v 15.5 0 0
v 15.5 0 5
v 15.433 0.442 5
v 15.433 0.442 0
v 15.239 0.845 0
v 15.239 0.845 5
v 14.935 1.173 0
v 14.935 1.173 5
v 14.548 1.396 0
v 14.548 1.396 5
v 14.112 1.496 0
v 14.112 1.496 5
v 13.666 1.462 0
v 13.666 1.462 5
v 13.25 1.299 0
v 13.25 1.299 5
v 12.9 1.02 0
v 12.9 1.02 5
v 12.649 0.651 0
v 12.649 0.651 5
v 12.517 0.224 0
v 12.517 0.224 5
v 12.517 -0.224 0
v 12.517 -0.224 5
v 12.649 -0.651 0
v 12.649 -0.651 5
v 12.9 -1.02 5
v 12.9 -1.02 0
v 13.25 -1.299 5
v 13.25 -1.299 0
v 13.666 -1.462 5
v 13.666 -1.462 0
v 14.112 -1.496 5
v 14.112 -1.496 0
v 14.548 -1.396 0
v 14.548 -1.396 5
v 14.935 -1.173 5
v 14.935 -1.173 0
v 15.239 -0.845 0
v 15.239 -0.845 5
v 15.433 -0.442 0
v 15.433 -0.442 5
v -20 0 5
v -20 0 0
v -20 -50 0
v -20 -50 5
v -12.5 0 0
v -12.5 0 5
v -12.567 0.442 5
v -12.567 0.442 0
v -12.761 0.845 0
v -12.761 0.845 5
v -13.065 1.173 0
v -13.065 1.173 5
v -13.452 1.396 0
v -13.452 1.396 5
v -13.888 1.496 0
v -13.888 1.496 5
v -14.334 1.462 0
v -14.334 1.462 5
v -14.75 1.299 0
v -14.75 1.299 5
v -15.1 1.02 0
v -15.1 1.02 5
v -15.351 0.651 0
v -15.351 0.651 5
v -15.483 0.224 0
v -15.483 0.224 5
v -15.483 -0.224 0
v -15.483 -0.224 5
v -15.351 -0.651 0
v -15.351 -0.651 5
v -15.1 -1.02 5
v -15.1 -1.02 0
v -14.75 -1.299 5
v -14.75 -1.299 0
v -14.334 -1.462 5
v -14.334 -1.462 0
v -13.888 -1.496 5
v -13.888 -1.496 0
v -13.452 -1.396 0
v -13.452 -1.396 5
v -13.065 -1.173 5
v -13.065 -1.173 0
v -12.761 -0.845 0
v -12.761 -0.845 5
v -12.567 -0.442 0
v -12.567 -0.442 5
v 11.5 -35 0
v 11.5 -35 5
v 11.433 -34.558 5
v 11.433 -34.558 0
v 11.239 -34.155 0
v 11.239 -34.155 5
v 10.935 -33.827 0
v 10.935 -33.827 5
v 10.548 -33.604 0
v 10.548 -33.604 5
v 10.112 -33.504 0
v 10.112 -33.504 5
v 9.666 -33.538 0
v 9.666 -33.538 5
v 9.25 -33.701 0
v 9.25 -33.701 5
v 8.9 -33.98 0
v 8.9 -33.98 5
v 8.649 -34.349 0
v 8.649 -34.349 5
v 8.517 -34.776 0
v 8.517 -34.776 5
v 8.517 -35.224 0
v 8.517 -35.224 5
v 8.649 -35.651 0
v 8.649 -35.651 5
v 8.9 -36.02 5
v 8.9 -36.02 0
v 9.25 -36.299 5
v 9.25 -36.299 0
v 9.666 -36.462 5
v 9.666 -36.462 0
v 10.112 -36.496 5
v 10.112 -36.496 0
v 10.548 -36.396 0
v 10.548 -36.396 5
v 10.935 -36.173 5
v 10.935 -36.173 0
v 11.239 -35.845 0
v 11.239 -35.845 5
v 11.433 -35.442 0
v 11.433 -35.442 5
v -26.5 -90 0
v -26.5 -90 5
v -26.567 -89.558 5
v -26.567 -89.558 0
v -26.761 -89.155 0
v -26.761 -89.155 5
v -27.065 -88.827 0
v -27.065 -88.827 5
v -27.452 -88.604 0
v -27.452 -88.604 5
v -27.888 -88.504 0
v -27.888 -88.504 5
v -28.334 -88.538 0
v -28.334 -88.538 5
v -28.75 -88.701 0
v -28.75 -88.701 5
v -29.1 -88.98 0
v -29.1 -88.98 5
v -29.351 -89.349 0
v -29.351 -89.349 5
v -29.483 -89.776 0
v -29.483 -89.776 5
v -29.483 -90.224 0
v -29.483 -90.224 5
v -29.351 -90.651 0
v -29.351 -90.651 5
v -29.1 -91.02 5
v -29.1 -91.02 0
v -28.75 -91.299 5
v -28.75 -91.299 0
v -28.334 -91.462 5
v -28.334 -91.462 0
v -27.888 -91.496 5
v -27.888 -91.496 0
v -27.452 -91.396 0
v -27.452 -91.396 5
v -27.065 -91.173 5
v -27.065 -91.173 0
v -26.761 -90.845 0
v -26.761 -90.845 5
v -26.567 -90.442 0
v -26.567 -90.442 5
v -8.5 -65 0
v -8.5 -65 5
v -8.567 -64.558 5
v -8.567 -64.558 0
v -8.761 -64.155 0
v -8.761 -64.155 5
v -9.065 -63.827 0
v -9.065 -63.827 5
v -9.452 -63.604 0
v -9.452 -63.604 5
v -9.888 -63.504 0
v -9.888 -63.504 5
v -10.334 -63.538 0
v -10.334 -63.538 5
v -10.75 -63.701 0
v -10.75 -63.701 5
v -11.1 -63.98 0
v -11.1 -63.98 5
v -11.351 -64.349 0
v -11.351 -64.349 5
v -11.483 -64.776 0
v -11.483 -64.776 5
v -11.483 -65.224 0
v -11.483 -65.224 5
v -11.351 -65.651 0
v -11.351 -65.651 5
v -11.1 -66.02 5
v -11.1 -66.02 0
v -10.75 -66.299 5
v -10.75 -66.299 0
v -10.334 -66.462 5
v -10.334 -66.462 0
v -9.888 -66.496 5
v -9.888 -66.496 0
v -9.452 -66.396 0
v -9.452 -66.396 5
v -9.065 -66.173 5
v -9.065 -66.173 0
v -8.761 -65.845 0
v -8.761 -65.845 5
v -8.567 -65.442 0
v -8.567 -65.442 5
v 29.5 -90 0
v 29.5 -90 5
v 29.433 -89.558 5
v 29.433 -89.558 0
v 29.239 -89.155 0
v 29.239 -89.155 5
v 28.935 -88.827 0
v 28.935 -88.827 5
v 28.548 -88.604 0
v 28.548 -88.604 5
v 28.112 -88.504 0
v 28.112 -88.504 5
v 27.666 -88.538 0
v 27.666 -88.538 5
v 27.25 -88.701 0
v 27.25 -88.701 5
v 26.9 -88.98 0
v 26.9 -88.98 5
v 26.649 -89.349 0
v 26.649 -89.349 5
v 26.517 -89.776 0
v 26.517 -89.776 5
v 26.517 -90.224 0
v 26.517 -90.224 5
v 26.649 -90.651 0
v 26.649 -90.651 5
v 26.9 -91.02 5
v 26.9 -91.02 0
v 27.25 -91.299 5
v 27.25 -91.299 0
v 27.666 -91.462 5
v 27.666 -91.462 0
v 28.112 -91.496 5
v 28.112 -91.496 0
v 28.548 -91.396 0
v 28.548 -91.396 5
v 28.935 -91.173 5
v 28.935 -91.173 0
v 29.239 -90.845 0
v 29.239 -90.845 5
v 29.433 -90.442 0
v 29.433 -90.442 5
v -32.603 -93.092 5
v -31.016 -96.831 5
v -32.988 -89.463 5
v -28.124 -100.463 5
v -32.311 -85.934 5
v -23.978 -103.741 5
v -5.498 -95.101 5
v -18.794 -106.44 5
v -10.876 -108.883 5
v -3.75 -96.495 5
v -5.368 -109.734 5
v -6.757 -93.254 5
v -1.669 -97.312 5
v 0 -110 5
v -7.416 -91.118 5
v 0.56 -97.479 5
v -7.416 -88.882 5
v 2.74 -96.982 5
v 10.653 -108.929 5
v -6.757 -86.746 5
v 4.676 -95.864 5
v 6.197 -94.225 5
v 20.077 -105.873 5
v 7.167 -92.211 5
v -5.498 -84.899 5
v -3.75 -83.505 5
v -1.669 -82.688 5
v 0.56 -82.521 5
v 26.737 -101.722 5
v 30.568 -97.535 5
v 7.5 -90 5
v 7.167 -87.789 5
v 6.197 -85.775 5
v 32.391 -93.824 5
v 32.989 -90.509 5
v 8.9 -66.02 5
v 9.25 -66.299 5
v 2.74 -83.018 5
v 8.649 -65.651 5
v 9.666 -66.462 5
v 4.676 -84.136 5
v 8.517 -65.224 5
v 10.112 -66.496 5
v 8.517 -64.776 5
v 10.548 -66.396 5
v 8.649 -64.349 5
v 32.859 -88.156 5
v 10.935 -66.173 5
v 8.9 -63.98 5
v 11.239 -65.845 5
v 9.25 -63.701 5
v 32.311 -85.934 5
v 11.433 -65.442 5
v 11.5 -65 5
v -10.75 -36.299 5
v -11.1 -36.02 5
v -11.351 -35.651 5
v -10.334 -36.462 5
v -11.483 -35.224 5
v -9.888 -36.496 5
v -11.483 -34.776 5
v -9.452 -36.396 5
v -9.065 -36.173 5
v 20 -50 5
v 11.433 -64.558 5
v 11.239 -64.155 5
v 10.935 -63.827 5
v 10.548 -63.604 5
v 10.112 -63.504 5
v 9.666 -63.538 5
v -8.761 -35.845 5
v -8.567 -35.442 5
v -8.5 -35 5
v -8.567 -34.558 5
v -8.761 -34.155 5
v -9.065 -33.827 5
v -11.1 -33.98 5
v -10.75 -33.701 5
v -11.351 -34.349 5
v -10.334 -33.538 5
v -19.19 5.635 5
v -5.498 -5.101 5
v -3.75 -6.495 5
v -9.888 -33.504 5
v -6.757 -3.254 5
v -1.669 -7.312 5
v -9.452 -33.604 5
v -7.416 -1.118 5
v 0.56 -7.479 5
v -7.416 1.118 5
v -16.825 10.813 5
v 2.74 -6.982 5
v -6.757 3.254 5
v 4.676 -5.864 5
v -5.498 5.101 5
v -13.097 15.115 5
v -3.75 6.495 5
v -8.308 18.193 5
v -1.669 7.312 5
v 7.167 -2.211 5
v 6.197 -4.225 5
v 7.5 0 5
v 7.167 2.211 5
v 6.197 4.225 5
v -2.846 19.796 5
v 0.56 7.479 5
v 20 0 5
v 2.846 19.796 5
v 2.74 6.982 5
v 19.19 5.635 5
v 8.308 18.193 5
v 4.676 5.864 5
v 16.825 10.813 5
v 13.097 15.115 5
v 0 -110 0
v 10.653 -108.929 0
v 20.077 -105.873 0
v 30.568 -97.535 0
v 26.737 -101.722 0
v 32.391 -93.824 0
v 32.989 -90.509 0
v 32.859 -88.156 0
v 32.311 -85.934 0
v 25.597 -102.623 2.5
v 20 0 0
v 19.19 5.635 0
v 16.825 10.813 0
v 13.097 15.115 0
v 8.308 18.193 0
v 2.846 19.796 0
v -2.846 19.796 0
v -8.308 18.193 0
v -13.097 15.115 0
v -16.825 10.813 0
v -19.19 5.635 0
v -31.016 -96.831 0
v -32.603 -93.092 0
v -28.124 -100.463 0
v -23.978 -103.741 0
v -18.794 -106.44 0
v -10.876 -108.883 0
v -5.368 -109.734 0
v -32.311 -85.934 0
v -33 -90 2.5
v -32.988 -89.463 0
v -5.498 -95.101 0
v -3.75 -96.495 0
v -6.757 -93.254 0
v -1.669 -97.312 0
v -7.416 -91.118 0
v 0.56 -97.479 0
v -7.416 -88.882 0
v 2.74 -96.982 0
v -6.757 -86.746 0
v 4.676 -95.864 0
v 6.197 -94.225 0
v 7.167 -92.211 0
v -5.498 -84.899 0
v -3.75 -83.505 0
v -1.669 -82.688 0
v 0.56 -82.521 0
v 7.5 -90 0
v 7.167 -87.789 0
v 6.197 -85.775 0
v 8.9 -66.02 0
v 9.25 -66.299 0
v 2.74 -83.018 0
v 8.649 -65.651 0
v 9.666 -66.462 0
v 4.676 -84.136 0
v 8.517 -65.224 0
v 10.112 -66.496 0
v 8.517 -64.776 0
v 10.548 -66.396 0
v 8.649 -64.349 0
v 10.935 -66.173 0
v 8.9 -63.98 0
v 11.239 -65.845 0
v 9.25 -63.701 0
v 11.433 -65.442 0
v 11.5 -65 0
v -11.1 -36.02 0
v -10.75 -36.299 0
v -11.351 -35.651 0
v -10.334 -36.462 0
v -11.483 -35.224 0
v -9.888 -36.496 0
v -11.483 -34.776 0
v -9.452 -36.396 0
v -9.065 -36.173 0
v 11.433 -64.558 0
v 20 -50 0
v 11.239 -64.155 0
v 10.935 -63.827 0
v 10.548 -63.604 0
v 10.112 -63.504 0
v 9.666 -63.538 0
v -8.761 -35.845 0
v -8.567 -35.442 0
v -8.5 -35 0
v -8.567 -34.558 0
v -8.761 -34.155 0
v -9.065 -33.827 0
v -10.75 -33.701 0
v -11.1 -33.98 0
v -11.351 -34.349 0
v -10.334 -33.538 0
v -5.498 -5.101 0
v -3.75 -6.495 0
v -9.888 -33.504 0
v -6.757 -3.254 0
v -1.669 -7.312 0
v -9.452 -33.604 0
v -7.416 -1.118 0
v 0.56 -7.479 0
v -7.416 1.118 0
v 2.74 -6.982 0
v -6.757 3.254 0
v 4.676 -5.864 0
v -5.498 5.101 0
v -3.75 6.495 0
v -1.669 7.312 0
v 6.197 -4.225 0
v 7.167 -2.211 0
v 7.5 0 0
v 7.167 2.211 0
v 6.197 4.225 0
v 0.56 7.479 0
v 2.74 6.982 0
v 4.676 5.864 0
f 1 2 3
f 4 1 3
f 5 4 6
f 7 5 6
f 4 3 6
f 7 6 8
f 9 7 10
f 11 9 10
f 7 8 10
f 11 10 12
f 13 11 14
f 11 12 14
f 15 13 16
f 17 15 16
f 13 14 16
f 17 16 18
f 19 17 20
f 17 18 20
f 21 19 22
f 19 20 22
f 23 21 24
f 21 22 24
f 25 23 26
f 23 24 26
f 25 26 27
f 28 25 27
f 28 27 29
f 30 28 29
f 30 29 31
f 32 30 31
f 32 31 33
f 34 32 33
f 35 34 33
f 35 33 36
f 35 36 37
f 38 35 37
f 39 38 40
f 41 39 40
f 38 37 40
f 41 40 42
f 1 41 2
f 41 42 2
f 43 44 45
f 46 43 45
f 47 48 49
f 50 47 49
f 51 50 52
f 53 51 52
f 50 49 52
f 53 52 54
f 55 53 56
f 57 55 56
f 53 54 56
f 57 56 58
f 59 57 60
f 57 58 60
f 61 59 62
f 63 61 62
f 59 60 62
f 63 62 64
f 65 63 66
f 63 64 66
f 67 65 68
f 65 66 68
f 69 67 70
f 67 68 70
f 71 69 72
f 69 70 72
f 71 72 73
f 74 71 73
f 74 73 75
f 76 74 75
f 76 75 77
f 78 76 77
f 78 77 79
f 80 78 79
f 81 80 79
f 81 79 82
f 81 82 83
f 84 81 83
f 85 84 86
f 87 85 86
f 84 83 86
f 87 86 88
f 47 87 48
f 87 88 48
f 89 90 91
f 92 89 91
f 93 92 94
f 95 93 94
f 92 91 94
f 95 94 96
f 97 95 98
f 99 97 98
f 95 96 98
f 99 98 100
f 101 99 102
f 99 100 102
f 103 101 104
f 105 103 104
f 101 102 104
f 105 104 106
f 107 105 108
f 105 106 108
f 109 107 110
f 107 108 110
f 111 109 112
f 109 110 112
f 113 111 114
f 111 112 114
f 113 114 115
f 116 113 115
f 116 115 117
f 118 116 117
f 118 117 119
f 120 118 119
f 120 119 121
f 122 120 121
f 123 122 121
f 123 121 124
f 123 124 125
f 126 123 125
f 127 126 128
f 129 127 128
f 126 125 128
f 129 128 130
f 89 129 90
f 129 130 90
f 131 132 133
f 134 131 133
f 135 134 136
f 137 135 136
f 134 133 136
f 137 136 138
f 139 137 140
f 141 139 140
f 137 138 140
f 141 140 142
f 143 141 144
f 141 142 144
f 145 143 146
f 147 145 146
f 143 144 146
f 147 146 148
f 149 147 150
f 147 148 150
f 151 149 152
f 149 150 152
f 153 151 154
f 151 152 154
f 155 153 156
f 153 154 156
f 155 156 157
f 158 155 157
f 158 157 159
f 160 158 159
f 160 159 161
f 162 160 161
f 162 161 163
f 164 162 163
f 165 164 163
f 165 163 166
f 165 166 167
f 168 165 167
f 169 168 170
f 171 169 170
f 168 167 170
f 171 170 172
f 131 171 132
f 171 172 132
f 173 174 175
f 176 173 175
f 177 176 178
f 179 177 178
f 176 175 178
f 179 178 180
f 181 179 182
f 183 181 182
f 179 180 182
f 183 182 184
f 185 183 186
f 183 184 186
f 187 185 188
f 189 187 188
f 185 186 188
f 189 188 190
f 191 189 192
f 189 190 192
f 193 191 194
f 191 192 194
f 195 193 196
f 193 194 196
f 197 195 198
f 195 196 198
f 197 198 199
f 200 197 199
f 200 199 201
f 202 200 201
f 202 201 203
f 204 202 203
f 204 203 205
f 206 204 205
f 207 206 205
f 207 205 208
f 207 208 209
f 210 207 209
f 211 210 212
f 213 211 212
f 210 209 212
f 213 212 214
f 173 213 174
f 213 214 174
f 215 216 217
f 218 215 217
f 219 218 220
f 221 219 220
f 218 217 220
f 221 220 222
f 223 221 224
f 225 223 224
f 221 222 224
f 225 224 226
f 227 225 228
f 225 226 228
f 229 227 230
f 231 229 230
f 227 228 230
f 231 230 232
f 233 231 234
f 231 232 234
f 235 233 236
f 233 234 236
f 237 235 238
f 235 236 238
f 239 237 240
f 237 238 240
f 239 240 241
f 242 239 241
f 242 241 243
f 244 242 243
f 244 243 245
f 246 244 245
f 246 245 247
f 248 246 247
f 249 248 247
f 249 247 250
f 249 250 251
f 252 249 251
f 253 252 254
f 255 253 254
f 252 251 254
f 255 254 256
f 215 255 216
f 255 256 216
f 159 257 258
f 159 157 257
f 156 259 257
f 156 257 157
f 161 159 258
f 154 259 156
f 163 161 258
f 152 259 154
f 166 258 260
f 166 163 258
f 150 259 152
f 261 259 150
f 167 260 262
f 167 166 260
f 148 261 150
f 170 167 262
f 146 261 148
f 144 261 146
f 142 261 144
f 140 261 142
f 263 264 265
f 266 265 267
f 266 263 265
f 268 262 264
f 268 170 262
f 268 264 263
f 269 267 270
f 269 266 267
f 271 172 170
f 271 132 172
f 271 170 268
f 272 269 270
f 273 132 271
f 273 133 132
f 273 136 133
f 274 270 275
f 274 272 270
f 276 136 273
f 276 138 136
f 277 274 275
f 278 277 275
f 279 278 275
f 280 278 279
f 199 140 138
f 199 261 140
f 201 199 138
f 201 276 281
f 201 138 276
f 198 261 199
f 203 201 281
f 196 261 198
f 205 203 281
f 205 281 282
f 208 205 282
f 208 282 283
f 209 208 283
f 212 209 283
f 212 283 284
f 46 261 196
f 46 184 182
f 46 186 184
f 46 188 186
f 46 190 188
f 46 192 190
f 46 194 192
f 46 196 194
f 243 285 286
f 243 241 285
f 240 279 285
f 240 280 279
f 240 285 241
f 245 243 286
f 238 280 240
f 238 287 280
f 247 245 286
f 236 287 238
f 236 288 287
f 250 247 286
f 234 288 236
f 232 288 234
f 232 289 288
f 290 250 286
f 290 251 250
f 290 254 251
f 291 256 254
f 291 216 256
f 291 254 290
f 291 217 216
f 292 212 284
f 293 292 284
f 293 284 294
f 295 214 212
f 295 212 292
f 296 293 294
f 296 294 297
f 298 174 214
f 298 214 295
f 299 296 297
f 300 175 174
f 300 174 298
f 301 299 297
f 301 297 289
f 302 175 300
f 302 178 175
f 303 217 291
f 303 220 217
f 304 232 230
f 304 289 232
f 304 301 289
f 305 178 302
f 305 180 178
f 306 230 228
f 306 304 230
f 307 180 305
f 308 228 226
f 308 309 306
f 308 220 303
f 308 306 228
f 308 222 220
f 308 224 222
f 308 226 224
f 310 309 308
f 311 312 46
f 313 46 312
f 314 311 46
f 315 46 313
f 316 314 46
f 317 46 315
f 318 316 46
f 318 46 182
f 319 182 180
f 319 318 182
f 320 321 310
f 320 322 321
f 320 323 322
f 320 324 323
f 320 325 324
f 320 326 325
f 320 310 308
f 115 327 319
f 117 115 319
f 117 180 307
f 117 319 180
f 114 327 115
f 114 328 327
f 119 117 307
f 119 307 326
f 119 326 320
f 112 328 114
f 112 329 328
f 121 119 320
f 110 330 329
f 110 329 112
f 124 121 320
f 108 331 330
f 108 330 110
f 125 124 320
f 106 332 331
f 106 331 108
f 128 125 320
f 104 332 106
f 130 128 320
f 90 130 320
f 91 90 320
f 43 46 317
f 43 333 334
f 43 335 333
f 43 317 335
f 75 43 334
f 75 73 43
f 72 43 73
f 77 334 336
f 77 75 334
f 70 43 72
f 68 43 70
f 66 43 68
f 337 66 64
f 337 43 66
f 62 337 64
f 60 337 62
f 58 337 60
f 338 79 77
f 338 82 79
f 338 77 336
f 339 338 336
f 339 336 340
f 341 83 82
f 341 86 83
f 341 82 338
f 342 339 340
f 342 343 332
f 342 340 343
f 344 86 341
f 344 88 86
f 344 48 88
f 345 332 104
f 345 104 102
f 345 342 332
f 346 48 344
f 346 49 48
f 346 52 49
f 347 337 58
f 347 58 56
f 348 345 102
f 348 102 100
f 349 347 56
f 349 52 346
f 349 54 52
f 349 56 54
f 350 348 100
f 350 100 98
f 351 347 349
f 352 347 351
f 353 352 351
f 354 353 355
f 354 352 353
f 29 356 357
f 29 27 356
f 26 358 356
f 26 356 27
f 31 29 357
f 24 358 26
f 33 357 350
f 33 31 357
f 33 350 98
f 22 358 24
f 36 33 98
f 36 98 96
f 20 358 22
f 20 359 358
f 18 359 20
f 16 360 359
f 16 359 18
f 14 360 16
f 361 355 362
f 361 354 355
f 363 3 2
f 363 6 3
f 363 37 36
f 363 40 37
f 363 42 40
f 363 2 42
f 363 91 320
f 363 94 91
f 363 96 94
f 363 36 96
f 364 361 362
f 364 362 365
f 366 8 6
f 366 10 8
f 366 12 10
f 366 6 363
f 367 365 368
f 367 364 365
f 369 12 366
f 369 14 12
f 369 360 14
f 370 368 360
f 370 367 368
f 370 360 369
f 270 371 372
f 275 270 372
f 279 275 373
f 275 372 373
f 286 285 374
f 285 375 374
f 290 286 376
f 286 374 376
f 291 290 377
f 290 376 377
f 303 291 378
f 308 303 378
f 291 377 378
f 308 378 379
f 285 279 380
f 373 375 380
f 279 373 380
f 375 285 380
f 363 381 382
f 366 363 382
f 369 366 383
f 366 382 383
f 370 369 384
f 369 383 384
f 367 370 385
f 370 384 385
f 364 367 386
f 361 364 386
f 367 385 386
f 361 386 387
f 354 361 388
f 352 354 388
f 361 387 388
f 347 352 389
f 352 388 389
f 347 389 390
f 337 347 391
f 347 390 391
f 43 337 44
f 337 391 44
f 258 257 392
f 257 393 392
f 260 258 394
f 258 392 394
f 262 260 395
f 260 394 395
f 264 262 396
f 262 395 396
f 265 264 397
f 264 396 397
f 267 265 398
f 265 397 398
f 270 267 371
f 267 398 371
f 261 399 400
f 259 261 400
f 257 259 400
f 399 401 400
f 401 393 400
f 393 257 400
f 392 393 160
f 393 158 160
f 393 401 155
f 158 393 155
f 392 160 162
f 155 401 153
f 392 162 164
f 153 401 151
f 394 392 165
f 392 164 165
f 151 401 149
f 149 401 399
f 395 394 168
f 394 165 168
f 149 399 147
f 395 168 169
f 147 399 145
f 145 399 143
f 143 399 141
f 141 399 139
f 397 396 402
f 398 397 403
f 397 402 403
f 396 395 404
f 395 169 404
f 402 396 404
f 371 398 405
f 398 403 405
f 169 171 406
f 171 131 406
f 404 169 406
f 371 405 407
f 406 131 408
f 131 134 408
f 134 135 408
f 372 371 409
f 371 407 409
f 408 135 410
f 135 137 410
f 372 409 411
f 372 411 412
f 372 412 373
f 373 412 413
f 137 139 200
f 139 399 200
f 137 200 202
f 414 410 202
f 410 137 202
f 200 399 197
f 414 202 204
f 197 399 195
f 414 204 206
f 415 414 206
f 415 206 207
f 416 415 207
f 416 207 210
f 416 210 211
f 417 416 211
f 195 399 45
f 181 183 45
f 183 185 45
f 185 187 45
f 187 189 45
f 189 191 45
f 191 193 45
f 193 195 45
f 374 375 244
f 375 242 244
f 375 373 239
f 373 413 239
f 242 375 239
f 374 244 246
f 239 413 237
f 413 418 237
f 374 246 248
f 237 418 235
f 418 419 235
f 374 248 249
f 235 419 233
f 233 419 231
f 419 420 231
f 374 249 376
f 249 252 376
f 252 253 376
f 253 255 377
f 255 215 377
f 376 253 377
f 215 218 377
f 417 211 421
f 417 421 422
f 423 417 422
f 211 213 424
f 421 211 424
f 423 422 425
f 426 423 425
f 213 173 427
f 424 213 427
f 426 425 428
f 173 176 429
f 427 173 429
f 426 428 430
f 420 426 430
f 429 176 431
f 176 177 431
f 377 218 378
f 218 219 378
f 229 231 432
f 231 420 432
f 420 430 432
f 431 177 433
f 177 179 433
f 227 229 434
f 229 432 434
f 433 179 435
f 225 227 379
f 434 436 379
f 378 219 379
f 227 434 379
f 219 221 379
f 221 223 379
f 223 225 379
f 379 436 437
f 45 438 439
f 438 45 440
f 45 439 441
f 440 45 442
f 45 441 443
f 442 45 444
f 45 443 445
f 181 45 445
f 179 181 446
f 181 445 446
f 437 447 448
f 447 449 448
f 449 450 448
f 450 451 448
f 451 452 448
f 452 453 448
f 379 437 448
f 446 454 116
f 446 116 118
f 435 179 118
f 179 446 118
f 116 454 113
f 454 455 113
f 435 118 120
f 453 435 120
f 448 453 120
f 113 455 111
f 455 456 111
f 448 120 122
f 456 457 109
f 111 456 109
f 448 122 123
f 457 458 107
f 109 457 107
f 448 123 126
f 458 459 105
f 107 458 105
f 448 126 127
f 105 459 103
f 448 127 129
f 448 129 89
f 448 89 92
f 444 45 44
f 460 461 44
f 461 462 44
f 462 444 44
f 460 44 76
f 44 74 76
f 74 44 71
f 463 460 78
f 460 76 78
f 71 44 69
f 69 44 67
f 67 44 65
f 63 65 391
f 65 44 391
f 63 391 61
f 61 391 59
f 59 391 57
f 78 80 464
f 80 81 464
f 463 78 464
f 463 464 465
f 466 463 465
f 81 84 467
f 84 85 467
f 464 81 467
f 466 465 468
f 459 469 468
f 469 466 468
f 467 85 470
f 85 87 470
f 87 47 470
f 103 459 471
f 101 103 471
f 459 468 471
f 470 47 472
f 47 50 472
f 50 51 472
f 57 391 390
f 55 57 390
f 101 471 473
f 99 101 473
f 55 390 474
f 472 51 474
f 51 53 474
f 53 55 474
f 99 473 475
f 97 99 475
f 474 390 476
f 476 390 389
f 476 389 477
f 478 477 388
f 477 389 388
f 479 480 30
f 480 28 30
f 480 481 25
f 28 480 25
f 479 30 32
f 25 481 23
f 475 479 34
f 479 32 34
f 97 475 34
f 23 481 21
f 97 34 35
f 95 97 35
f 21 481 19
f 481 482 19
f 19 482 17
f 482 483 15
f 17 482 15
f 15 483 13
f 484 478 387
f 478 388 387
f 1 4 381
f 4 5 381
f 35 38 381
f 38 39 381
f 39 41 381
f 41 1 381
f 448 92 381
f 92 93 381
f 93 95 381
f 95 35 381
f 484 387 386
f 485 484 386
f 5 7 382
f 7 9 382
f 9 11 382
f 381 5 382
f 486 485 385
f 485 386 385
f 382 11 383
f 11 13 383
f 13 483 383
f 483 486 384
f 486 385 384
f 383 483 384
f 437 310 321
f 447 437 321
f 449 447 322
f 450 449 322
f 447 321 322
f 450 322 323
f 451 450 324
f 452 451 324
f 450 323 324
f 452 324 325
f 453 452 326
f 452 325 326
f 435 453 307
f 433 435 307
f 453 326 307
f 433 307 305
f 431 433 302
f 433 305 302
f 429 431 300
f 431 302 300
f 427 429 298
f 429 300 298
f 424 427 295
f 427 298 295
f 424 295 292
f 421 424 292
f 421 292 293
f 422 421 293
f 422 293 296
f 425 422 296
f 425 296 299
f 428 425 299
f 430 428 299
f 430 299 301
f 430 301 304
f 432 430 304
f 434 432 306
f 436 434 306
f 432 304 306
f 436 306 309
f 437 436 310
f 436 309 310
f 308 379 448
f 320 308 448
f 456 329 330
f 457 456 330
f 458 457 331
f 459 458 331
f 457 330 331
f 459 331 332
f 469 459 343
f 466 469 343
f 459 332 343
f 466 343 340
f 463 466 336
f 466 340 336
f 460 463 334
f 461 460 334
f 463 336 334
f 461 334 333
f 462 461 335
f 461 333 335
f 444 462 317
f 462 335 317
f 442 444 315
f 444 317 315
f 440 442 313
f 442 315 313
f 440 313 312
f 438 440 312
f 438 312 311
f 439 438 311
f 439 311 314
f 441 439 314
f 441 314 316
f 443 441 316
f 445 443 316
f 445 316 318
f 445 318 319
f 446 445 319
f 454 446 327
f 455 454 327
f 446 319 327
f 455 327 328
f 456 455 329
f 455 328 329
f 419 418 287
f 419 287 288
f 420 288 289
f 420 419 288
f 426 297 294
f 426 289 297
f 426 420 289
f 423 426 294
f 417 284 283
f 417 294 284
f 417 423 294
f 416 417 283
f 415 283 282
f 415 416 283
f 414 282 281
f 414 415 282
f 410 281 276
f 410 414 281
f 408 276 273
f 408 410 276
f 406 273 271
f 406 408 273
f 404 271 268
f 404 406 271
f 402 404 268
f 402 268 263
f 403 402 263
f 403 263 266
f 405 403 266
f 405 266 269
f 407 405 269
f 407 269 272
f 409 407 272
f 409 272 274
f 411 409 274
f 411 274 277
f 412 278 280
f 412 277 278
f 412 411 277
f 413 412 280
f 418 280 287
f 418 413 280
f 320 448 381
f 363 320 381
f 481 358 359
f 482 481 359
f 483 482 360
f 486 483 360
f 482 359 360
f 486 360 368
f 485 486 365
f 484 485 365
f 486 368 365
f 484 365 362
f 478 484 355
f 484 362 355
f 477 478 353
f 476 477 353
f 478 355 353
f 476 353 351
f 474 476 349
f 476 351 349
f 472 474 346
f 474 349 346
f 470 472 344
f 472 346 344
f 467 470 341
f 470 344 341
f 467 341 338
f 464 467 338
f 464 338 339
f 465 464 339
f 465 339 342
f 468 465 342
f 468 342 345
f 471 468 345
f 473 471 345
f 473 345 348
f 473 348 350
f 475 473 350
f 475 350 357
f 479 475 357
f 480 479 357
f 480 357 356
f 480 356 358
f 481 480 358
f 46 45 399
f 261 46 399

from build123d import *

# Parameters (mm, degrees)
EXTRUDE_1_DEPTH          = 5
CUT_EXTRUDE_2_DEPTH      = 115.952164093
CUT_EXTRUDE_2_DEPTH_BACK = 115.952164093
SKETCH_3_OUTSIDE_W       = 97.176
SKETCH_3_OUTSIDE_H       = 161.176
SKETCH_3_OUTSIDE_R       = 7.5
SKETCH_4_R               = 7.5
CUT_EXTRUDE_3_DEPTH      = 115.952164093
SKETCH_5_R               = 1.5
CUT_EXTRUDE_4_DEPTH      = 5


with BuildPart() as part:
    # 草图1 → 凸台-拉伸1 (new body)
    with BuildSketch(Plane.XY):
        with BuildLine():
            Line((-20, 0), (-20, -50))
            Line((-20, -50), (-20, -74.091630608))
            add(Edge.make_bspline(
                [(-2.03e-07, -70), (-11.13946442, -70.000000042), (-20, -74.091630608)],
                knots=[4.712388987, 4.712388987, 4.712388987, 5.363487565, 5.363487565, 5.363487565], degree=2, weights=[1, 0.947475191, 1]))
            add(Edge.make_bspline(
                [(20, -74.091630608), (11.13946424, -69.999999958), (-2.03e-07, -70)],
                knots=[4.061290395, 4.061290395, 4.061290395, 4.712388987, 4.712388987, 4.712388987], degree=2, weights=[1, 0.947475189, 1]))
            Line((20, -74.091630608), (20, -50))
            Line((20, -50), (20, 0))
            ThreePointArc((20, 0), (0, -20), (-20, 0))
        make_face()
        with BuildLine():
            Line((-20, -74.091630608), (-20, -50))
            Line((-20, -50), (-32.310858712, -85.934042004))
            add(Edge.make_bspline(
                [(-20, -74.091630608), (-29.804870228, -78.619337355), (-32.310858712, -85.934042004)],
                knots=[5.363487565, 5.363487565, 5.363487565, 6.078460318, 6.078460318, 6.078460318], degree=2, weights=[1, 0.936779351, 1]))
        make_face()
        with BuildLine():
            add(Edge.make_bspline(
                [(-20, -74.091630608), (-29.804870228, -78.619337355), (-32.310858712, -85.934042004)],
                knots=[5.363487565, 5.363487565, 5.363487565, 6.078460318, 6.078460318, 6.078460318], degree=2, weights=[1, 0.936779351, 1]))
            add(Edge.make_bspline(
                [(-32.310858712, -85.934042004), (-33, -87.945569596), (-33, -90)],
                knots=[6.078460318, 6.078460318, 6.078460318, 6.283185307, 6.283185307, 6.283185307], degree=2, weights=[1, 0.994765533, 1]))
            add(Edge.make_bspline(
                [(-33, -90), (-33, -109.999999875), (-2.06e-07, -110)],
                knots=[0, 0, 0, 1.570796321, 1.570796321, 1.570796321], degree=2, weights=[1, 0.707106783, 1]))
            ThreePointArc((-2.06e-07, -110), (-14.142135697, -104.142135551), (-20, -90))
            Line((-20, -90), (-20, -74.091630608))
        make_face()
        with BuildLine():
            add(Edge.make_bspline(
                [(-2.03e-07, -70), (-11.13946442, -70.000000042), (-20, -74.091630608)],
                knots=[4.712388987, 4.712388987, 4.712388987, 5.363487565, 5.363487565, 5.363487565], degree=2, weights=[1, 0.947475191, 1]))
            Line((-20, -74.091630608), (-20, -90))
            ThreePointArc((-20, -90), (-14.142135696, -75.857864448), (-2.03e-07, -70))
        make_face()
        with BuildLine():
            add(Edge.make_bspline(
                [(-20, -74.091630608), (-29.804870228, -78.619337355), (-32.310858712, -85.934042004)],
                knots=[5.363487565, 5.363487565, 5.363487565, 6.078460318, 6.078460318, 6.078460318], degree=2, weights=[1, 0.936779351, 1]))
            add(Edge.make_bspline(
                [(-32.310858712, -85.934042004), (-33, -87.945569596), (-33, -90)],
                knots=[6.078460318, 6.078460318, 6.078460318, 6.283185307, 6.283185307, 6.283185307], degree=2, weights=[1, 0.994765533, 1]))
            add(Edge.make_bspline(
                [(-33, -90), (-33, -109.999999875), (-2.06e-07, -110)],
                knots=[0, 0, 0, 1.570796321, 1.570796321, 1.570796321], degree=2, weights=[1, 0.707106783, 1]))
            ThreePointArc((-2.06e-07, -110), (-14.142135697, -104.142135551), (-20, -90))
            Line((-20, -90), (-20, -74.091630608))
        make_face()
        with BuildLine():
            add(Edge.make_bspline(
                [(-2.03e-07, -70), (-11.13946442, -70.000000042), (-20, -74.091630608)],
                knots=[4.712388987, 4.712388987, 4.712388987, 5.363487565, 5.363487565, 5.363487565], degree=2, weights=[1, 0.947475191, 1]))
            Line((-20, -74.091630608), (-20, -90))
            ThreePointArc((-20, -90), (-14.142135696, -75.857864448), (-2.03e-07, -70))
        make_face()
        with BuildLine():
            add(Edge.make_bspline(
                [(20, -74.091630608), (11.13946424, -69.999999958), (-2.03e-07, -70)],
                knots=[4.061290395, 4.061290395, 4.061290395, 4.712388987, 4.712388987, 4.712388987], degree=2, weights=[1, 0.947475189, 1]))
            ThreePointArc((-2.03e-07, -70), (14.142135552, -75.857864304), (20, -90))
            Line((20, -90), (20, -74.091630608))
        make_face()
        with BuildLine():
            ThreePointArc((20, -90), (14.142135551, -104.142135697), (-2.06e-07, -110))
            add(Edge.make_bspline(
                [(-2.06e-07, -110), (40.555759481, -110.000000153), (32.310858712, -85.934042004)],
                knots=[1.570796321, 1.570796321, 1.570796321, 3.346317643, 3.346317643, 3.346317643], degree=2, weights=[1, 0.631150574, 1]))
            add(Edge.make_bspline(
                [(32.310858712, -85.934042004), (29.804870228, -78.619337355), (20, -74.091630608)],
                knots=[3.346317643, 3.346317643, 3.346317643, 4.061290395, 4.061290395, 4.061290395], degree=2, weights=[1, 0.936779351, 1]))
            Line((20, -74.091630608), (20, -90))
        make_face()
        with BuildLine():
            Line((32.310858712, -85.934042004), (20, -50))
            Line((20, -50), (20, -74.091630608))
            add(Edge.make_bspline(
                [(32.310858712, -85.934042004), (29.804870228, -78.619337355), (20, -74.091630608)],
                knots=[3.346317643, 3.346317643, 3.346317643, 4.061290395, 4.061290395, 4.061290395], degree=2, weights=[1, 0.936779351, 1]))
        make_face()
        with BuildLine():
            add(Edge.make_bspline(
                [(20, -74.091630608), (11.13946424, -69.999999958), (-2.03e-07, -70)],
                knots=[4.061290395, 4.061290395, 4.061290395, 4.712388987, 4.712388987, 4.712388987], degree=2, weights=[1, 0.947475189, 1]))
            ThreePointArc((-2.03e-07, -70), (14.142135552, -75.857864304), (20, -90))
            Line((20, -90), (20, -74.091630608))
        make_face()
        with BuildLine():
            ThreePointArc((20, -90), (14.142135551, -104.142135697), (-2.06e-07, -110))
            add(Edge.make_bspline(
                [(-2.06e-07, -110), (40.555759481, -110.000000153), (32.310858712, -85.934042004)],
                knots=[1.570796321, 1.570796321, 1.570796321, 3.346317643, 3.346317643, 3.346317643], degree=2, weights=[1, 0.631150574, 1]))
            add(Edge.make_bspline(
                [(32.310858712, -85.934042004), (29.804870228, -78.619337355), (20, -74.091630608)],
                knots=[3.346317643, 3.346317643, 3.346317643, 4.061290395, 4.061290395, 4.061290395], degree=2, weights=[1, 0.936779351, 1]))
            Line((20, -74.091630608), (20, -90))
        make_face()
        with BuildLine():
            ThreePointArc((20, 0), (0, 20), (-20, 0))
            Line((-20, 0), (20, 0))
        make_face()
        with BuildLine():
            Line((20, 0), (-20, 0))
            ThreePointArc((-20, 0), (0, -20), (20, 0))
        make_face()
        with BuildLine():
            ThreePointArc((20, 0), (0, 20), (-20, 0))
            Line((-20, 0), (20, 0))
        make_face()
        with BuildLine():
            Line((20, 0), (-20, 0))
            ThreePointArc((-20, 0), (0, -20), (20, 0))
        make_face()
        with BuildLine():
            ThreePointArc((-2.03e-07, -70), (-14.142135696, -75.857864448), (-20, -90))
            Line((-20, -90), (20, -90))
            ThreePointArc((20, -90), (14.142135552, -75.857864304), (-2.03e-07, -70))
        make_face()
        with BuildLine():
            Line((20, -90), (-20, -90))
            ThreePointArc((-20, -90), (-14.142135697, -104.142135551), (-2.06e-07, -110))
            ThreePointArc((-2.06e-07, -110), (14.142135551, -104.142135697), (20, -90))
        make_face()
        with BuildLine():
            ThreePointArc((-2.03e-07, -70), (-14.142135696, -75.857864448), (-20, -90))
            Line((-20, -90), (20, -90))
            ThreePointArc((20, -90), (14.142135552, -75.857864304), (-2.03e-07, -70))
        make_face()
        with BuildLine():
            Line((20, -90), (-20, -90))
            ThreePointArc((-20, -90), (-14.142135697, -104.142135551), (-2.06e-07, -110))
            ThreePointArc((-2.06e-07, -110), (14.142135551, -104.142135697), (20, -90))
        make_face()
    extrude(amount=EXTRUDE_1_DEPTH)

    # 草图3 outside → 切除-拉伸2 (cut, two sides: drawn at the far end of the back side and taken through both)
    # profile 1 of 2: a face of its own
    with BuildSketch(Plane.XY.offset(5).offset(-CUT_EXTRUDE_2_DEPTH_BACK)):
        with Locations((0, -45)):
            Rectangle(SKETCH_3_OUTSIDE_W, SKETCH_3_OUTSIDE_H)
        with BuildLine():
            Line((32.310858712, -85.934042004), (20, -50))
            Line((20, -50), (20, 0))
            ThreePointArc((20, 0), (0, 20), (-20, 0))
            Line((-20, 0), (-20, -50))
            Line((-20, -50), (-32.310858712, -85.934042004))
            add(Edge.make_bspline(
                [(-32.310858712, -85.934042004), (-40.555759429, -110), (0, -110), (40.555759429, -110), (32.310858712, -85.934042004)],
                knots=[6.078460318, 6.078460318, 6.078460318, 7.853981634, 7.853981634, 9.62950295, 9.62950295, 9.62950295], degree=2, weights=[1, 0.631150576, 1, 0.631150576, 1]))
        make_face(mode=Mode.SUBTRACT)
    # profile 2 of 2: a face of its own
    with BuildSketch(Plane.XY.offset(5).offset(-CUT_EXTRUDE_2_DEPTH_BACK)):
        with Locations((0, -90)):
            Circle(SKETCH_3_OUTSIDE_R)
    extrude(amount=CUT_EXTRUDE_2_DEPTH + CUT_EXTRUDE_2_DEPTH_BACK, mode=Mode.SUBTRACT)

    # 草图4 → 切除-拉伸3 (cut, through all)
    with BuildSketch(Plane.XY.offset(5)):
        Circle(SKETCH_4_R)
    extrude(amount=-CUT_EXTRUDE_3_DEPTH, mode=Mode.SUBTRACT)

    # 草图5 → 切除-拉伸4 (cut)
    with BuildSketch(Plane.XY.offset(5)):
        with Locations((28, -90)):
            Circle(SKETCH_5_R)
        with Locations((14, 0)):
            Circle(SKETCH_5_R)
        with Locations((10, -35)):
            Circle(SKETCH_5_R)
        with Locations((10, -65)):
            Circle(SKETCH_5_R)
        with Locations((-14, 0)):
            Circle(SKETCH_5_R)
        with Locations((-10, -35)):
            Circle(SKETCH_5_R)
        with Locations((-10, -65)):
            Circle(SKETCH_5_R)
        with Locations((-28, -90)):
            Circle(SKETCH_5_R)
    extrude(amount=-CUT_EXTRUDE_4_DEPTH, mode=Mode.SUBTRACT)


solid = part.part
